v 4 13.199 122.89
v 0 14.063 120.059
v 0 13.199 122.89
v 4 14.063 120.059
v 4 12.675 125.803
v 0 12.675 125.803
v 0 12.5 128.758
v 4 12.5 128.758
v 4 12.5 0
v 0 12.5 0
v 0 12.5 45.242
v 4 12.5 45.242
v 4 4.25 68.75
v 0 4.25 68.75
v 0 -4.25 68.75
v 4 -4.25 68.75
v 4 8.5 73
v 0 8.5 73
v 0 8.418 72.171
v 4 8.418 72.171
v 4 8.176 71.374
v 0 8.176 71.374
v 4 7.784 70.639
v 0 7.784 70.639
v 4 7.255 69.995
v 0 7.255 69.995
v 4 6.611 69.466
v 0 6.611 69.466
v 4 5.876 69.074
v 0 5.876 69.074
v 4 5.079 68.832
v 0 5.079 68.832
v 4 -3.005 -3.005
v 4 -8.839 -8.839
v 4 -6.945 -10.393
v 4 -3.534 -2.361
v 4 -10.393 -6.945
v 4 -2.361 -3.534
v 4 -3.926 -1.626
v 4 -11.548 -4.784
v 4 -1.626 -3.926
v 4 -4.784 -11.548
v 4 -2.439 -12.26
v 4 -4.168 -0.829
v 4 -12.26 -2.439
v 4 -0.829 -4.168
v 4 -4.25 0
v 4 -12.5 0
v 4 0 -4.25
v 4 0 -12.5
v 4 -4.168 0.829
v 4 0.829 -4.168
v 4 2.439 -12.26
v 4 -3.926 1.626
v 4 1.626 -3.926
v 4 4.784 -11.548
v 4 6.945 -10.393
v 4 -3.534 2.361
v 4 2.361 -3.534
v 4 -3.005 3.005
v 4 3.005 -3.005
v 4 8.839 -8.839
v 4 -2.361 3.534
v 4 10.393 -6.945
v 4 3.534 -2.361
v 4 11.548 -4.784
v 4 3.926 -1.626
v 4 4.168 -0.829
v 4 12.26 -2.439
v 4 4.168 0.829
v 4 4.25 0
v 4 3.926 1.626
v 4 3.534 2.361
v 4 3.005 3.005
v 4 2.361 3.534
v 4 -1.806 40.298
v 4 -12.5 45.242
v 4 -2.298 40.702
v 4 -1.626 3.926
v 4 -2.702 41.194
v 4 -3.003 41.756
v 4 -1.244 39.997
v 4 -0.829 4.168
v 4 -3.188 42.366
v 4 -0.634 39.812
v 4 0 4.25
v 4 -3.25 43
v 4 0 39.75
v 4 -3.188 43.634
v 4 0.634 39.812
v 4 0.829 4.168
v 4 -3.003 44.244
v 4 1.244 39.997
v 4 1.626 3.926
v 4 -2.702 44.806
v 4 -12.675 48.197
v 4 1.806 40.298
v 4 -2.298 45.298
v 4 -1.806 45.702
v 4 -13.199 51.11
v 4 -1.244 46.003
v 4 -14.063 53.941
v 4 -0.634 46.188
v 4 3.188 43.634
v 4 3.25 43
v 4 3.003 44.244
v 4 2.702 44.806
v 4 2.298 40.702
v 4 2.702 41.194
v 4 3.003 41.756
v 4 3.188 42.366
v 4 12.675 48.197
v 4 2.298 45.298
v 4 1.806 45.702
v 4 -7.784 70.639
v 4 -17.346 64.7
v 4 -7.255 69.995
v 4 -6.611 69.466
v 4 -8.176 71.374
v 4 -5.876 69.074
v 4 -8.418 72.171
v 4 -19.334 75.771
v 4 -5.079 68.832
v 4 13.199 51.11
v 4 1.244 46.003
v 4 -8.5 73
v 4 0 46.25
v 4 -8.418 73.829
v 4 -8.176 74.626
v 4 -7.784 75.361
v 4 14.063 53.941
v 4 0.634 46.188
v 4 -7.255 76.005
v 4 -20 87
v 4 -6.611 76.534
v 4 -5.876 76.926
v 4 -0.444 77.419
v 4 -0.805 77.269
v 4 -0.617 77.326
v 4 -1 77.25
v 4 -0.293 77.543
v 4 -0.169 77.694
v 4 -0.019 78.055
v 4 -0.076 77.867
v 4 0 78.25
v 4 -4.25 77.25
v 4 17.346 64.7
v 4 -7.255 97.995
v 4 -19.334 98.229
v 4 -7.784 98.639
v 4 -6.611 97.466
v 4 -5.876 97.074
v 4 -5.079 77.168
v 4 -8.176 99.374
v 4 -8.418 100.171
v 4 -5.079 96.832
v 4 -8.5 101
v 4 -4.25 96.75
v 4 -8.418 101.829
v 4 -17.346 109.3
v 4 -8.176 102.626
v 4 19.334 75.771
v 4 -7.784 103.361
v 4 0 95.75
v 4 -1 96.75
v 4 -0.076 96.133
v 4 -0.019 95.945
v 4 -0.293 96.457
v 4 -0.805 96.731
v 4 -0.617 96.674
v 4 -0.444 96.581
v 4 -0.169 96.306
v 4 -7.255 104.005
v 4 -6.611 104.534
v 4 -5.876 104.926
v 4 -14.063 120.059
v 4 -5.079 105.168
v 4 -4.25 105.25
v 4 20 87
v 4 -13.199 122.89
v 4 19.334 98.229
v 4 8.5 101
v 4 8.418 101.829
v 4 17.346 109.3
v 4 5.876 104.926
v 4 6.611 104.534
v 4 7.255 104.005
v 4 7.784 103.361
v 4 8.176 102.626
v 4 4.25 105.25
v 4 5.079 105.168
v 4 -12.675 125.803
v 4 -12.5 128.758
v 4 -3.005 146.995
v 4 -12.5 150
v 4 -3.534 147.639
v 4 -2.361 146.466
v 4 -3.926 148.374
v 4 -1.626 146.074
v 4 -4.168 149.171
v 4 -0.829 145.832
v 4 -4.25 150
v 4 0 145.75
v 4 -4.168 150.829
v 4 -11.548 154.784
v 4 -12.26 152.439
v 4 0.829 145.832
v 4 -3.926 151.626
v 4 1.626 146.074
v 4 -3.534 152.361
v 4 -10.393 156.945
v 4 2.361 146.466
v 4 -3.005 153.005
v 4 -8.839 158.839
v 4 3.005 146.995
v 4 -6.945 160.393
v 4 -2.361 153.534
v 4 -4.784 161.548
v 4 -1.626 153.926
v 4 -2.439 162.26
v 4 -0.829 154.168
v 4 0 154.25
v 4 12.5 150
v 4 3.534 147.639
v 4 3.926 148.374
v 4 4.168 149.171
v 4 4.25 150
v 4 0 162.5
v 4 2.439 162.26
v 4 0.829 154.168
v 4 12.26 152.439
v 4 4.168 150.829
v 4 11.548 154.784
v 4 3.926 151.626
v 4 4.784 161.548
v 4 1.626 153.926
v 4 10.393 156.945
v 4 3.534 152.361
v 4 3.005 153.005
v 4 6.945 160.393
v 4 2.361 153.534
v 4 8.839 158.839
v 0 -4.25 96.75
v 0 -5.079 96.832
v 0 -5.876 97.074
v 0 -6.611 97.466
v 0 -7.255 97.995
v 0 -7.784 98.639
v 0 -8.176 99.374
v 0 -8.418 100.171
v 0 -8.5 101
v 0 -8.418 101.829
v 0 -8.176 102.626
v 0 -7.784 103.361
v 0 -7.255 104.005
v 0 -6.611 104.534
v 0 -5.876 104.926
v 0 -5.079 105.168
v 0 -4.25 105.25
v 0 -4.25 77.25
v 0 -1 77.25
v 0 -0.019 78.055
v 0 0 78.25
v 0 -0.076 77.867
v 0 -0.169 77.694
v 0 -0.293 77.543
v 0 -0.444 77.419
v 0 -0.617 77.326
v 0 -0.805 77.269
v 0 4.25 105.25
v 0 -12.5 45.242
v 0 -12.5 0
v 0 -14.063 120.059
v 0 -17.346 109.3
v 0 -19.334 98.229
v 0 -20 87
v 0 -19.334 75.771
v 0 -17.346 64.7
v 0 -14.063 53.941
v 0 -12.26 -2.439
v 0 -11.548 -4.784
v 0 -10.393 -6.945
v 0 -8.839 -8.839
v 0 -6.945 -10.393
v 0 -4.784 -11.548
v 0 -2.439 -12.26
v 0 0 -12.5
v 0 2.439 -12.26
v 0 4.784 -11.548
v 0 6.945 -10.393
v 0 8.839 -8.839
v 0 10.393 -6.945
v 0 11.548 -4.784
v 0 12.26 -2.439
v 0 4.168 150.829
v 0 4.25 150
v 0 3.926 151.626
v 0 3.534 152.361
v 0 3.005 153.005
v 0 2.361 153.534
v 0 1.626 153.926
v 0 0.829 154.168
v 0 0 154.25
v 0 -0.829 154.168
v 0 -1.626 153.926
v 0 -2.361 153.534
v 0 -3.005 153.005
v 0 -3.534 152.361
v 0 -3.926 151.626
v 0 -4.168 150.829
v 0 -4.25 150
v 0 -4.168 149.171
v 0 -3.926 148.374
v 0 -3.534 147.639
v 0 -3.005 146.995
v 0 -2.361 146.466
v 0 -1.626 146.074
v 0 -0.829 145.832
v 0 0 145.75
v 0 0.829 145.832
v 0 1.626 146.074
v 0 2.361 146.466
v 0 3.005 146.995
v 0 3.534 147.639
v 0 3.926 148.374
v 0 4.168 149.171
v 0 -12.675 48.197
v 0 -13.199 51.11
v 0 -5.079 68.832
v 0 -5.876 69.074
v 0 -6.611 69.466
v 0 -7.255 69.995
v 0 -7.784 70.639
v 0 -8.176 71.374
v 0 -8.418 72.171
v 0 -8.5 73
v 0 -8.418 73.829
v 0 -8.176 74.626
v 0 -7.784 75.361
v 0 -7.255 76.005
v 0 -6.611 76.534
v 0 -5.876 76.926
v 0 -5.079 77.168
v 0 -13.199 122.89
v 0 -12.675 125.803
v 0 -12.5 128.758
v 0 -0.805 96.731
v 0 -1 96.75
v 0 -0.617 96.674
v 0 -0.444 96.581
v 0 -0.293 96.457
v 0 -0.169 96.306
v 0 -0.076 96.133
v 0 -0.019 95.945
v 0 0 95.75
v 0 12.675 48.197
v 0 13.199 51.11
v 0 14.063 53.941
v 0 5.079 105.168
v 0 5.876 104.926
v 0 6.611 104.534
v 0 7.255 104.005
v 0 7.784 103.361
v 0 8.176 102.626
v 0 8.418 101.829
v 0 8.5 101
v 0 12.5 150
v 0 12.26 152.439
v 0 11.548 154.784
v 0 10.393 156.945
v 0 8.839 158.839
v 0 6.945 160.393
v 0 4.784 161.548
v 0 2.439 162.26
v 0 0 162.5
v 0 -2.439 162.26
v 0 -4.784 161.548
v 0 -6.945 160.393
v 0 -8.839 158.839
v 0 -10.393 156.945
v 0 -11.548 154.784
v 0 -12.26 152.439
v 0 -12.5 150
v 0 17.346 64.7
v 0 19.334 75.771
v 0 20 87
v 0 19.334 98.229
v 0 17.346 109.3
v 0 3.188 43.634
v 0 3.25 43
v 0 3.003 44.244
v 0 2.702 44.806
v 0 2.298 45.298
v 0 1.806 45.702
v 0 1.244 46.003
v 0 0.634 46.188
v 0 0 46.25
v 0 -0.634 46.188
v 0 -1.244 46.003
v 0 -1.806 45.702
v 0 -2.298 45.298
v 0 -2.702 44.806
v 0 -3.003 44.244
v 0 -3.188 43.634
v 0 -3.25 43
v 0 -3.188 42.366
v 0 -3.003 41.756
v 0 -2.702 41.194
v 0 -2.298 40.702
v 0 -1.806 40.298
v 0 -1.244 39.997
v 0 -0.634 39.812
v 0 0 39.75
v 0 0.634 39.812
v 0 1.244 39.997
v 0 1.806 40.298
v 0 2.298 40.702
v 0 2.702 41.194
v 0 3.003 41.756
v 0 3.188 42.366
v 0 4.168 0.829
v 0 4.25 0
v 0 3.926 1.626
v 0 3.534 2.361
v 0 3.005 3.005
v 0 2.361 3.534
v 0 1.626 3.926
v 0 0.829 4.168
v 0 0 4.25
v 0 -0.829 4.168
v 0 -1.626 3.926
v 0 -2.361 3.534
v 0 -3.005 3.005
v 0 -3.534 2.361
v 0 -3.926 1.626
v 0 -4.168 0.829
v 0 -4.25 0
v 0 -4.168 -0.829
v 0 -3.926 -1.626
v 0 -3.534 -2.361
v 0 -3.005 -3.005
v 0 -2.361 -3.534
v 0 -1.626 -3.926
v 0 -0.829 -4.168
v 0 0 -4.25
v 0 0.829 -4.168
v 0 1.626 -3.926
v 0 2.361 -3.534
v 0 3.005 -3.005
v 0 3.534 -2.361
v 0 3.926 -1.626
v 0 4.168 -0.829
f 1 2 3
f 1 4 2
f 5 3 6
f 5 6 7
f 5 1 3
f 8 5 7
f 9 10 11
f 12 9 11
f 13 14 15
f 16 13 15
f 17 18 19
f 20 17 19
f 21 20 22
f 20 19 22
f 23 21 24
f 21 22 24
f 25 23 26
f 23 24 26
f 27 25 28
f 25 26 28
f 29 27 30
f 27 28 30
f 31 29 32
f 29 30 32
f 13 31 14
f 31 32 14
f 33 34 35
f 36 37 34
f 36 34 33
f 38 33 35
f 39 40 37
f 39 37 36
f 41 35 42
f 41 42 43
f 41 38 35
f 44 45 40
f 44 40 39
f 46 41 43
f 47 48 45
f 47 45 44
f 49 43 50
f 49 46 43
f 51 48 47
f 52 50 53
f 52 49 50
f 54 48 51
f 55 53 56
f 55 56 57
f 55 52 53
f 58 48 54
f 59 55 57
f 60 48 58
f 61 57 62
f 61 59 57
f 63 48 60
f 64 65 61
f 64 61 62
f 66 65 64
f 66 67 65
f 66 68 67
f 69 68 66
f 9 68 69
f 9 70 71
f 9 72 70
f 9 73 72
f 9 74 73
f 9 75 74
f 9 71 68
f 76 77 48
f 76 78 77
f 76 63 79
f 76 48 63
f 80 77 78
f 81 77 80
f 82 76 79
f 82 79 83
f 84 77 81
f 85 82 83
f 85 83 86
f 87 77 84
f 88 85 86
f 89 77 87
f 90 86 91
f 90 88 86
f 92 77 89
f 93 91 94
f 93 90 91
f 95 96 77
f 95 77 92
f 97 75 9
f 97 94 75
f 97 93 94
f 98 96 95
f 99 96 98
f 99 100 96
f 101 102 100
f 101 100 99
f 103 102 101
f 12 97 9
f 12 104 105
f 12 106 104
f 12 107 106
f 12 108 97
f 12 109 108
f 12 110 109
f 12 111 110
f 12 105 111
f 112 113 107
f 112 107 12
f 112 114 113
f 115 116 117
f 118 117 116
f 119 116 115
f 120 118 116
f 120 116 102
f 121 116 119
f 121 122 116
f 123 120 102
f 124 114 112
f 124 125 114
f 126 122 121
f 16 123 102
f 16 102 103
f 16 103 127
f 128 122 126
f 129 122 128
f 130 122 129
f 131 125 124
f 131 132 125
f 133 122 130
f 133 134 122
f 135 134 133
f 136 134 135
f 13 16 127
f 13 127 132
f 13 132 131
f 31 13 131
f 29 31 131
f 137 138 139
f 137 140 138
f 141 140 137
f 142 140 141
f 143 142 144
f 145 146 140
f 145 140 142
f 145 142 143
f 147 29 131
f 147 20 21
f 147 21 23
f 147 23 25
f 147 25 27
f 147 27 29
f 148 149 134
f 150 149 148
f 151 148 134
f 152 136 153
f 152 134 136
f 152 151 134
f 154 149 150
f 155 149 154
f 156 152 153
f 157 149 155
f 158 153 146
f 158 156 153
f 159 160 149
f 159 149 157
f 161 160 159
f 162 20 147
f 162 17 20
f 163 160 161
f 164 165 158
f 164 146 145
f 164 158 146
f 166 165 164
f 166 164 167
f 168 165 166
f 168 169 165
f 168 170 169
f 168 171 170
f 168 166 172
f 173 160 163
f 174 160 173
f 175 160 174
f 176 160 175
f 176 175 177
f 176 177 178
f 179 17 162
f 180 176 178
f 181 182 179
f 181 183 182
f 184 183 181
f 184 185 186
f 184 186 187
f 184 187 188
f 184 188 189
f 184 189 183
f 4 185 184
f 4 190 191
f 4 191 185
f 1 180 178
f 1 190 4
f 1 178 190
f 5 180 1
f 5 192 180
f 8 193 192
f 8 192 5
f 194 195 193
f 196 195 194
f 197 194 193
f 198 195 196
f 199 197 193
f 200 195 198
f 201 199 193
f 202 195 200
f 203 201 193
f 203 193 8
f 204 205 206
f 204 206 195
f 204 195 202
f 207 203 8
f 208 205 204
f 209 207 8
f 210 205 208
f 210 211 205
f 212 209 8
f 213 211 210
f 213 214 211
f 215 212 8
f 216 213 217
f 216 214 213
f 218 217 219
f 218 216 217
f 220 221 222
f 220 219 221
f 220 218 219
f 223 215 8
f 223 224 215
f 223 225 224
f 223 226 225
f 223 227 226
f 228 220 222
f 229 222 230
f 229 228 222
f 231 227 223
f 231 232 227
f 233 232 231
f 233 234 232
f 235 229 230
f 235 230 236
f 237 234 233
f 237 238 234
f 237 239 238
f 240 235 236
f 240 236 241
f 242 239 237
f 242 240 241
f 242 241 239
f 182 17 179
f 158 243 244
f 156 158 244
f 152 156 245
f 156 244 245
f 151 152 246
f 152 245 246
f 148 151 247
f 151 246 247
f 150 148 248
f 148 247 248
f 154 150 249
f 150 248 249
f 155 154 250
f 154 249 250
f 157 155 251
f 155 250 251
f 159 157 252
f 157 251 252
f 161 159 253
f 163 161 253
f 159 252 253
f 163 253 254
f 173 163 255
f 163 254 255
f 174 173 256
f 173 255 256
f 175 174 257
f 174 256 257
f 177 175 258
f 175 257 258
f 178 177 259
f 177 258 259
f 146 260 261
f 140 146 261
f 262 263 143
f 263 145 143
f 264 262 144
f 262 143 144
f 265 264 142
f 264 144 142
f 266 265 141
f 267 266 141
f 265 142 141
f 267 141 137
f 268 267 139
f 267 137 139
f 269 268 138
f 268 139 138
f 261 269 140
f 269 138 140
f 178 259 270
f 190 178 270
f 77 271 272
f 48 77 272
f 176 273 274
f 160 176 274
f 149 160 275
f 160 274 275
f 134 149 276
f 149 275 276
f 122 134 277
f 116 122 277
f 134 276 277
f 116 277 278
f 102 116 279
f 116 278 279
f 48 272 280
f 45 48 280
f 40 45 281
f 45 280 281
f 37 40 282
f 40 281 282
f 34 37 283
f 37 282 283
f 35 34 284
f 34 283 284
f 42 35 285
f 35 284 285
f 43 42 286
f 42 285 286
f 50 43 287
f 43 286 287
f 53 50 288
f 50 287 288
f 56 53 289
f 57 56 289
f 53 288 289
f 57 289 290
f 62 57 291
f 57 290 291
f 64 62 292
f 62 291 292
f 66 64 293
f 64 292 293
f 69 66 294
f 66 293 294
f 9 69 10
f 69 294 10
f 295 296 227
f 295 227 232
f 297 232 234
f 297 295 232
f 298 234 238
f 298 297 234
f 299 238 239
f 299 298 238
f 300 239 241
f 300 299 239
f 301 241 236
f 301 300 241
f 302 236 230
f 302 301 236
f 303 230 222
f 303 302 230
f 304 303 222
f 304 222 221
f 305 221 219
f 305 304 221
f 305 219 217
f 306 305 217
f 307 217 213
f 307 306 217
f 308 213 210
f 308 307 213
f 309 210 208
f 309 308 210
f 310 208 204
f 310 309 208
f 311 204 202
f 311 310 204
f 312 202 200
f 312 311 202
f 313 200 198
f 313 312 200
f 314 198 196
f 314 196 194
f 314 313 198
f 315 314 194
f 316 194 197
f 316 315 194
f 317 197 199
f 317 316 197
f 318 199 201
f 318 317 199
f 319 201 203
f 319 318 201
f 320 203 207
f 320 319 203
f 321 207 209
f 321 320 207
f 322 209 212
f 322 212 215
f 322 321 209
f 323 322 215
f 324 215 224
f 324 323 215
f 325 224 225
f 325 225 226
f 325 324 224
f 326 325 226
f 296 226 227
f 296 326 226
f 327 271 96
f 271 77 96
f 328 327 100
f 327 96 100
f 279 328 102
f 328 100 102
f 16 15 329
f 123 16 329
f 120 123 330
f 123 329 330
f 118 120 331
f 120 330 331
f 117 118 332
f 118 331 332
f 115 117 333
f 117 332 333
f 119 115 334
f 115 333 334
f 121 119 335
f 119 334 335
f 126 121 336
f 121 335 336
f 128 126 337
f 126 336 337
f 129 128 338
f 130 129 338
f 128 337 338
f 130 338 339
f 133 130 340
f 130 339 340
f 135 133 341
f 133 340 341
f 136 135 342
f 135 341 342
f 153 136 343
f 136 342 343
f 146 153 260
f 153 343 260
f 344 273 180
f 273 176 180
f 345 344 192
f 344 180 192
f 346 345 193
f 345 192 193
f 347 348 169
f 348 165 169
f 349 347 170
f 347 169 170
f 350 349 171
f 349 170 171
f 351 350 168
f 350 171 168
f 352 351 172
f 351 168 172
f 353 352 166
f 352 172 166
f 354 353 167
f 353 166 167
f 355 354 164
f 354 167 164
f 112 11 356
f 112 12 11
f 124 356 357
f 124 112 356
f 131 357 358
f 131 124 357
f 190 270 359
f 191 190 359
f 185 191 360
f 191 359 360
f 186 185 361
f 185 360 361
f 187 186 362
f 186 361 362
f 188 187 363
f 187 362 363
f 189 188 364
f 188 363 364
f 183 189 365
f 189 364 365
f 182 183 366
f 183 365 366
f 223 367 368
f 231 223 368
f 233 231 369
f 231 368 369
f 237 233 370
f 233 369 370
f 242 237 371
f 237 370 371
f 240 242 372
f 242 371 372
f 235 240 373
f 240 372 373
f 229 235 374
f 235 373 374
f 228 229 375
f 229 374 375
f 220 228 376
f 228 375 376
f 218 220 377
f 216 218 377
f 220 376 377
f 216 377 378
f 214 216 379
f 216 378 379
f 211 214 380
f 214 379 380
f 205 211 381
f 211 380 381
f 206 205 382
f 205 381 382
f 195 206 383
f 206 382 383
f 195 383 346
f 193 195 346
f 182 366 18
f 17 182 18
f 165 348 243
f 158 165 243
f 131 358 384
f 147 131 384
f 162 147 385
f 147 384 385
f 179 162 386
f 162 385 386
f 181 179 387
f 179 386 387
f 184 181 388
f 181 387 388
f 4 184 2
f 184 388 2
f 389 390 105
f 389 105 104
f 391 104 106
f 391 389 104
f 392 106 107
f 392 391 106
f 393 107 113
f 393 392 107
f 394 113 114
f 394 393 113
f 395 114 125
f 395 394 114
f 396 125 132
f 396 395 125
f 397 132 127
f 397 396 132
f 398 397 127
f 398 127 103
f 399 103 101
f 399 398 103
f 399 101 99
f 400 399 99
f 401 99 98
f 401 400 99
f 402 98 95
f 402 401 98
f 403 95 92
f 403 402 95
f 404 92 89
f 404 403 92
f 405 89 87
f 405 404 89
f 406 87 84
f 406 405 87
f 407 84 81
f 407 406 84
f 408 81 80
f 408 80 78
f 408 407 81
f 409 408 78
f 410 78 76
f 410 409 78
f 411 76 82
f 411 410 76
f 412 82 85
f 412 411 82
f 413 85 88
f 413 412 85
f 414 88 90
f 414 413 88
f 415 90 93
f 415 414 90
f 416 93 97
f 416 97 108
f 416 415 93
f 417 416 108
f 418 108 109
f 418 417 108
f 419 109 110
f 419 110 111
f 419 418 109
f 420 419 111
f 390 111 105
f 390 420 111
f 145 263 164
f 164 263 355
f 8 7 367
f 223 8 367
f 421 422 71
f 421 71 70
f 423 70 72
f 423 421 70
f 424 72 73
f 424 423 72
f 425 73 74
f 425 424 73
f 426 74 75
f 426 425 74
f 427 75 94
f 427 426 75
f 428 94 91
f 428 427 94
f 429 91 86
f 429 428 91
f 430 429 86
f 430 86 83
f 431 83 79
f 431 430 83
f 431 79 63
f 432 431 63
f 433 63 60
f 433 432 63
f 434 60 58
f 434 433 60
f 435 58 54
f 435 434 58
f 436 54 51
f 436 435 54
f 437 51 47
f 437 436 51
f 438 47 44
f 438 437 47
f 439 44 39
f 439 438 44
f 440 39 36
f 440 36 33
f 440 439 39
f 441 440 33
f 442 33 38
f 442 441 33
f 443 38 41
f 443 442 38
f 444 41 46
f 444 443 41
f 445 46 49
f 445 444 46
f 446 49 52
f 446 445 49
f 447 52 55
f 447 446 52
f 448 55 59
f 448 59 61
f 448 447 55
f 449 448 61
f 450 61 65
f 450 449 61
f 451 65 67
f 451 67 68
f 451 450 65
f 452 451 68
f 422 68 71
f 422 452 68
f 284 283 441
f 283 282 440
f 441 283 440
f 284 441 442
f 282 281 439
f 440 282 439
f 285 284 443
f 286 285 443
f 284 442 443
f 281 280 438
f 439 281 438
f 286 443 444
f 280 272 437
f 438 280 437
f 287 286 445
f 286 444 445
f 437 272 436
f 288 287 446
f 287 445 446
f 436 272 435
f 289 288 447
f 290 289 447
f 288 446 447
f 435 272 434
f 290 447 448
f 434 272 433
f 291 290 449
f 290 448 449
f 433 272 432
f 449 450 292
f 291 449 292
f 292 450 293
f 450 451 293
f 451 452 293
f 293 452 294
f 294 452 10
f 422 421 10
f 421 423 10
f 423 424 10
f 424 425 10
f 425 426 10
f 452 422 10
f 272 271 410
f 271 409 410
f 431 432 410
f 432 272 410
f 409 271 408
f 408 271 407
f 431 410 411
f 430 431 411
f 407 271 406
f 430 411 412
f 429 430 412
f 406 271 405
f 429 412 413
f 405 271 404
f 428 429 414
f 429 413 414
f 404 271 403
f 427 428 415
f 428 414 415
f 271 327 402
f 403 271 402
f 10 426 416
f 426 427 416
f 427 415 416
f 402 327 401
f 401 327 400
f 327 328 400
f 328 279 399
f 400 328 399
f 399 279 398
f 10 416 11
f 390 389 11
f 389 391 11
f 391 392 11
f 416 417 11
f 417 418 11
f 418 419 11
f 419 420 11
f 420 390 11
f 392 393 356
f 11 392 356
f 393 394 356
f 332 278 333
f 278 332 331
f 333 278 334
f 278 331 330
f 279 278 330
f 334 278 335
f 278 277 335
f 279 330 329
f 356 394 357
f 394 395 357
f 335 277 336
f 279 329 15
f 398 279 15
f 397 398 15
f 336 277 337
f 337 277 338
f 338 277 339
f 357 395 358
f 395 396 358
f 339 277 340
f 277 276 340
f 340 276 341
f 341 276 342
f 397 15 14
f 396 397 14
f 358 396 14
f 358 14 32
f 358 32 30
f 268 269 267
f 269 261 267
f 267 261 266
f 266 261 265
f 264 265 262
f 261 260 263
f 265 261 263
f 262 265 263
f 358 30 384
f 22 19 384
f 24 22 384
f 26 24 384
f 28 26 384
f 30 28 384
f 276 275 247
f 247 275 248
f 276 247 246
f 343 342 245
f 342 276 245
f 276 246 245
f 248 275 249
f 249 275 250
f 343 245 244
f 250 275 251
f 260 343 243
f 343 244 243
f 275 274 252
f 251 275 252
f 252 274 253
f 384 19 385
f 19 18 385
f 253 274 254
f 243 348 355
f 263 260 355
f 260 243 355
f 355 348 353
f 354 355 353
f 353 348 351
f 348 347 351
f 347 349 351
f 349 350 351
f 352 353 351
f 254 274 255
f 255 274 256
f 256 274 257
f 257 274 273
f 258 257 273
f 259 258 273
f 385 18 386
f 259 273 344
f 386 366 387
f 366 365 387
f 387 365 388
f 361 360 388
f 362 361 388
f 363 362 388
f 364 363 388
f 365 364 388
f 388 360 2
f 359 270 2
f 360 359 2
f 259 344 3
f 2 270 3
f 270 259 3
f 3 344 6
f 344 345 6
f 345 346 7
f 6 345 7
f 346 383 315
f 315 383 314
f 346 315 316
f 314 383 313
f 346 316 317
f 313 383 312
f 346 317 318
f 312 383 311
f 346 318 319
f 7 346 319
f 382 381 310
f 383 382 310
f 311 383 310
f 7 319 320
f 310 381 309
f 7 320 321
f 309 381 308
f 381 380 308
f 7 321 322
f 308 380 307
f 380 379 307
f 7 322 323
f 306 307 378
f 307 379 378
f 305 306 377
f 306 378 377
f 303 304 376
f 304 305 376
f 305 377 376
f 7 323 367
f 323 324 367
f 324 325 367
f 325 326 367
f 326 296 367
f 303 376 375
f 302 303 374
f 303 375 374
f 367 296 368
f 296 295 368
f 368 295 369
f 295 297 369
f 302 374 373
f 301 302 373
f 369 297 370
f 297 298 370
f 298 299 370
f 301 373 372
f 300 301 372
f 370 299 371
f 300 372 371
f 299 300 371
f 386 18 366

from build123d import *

# Parameters (mm, degrees)
F0_R     = 4.25
F0_R_2   = 3.25
F1_DEPTH = 4
F2_R     = 25
F3_R     = 1


with BuildPart() as f1:
    # F0 (on Right) → F1 (new body)
    with BuildSketch(Plane.YZ):
        with BuildLine():
            ThreePointArc((-12.5, 0), (0, -12.5), (12.5, 0))
            Line((12.5, 0), (12.5, 50.003379))
            ThreePointArc((12.5, 50.003379), (20, 87), (12.5, 123.996621))
            Line((12.5, 123.996621), (12.5, 150))
            ThreePointArc((12.5, 150), (0, 162.5), (-12.5, 150))
            Line((-12.5, 150), (-12.5, 123.996621))
            ThreePointArc((-12.5, 123.996621), (-20, 87), (-12.5, 50.003379))
            Line((-12.5, 50.003379), (-12.5, 0))
        make_face()
        Circle(F0_R, mode=Mode.SUBTRACT)
        with Locations((0, 43)):
            Circle(F0_R_2, mode=Mode.SUBTRACT)
        with BuildLine():
            ThreePointArc((-4.25, 96.75), (-8.5, 101), (-4.25, 105.25))
            Line((-4.25, 105.25), (4.25, 105.25))
            ThreePointArc((4.25, 105.25), (7.255204, 104.005204), (8.5, 101))
            Line((8.5, 101), (8.5, 73))
            ThreePointArc((8.5, 73), (7.255204, 69.994796), (4.25, 68.75))
            Line((4.25, 68.75), (-4.25, 68.75))
            ThreePointArc((-4.25, 68.75), (-8.5, 73), (-4.25, 77.25))
            Line((-4.25, 77.25), (0, 77.25))
            Line((0, 77.25), (0, 96.75))
            Line((0, 96.75), (-4.25, 96.75))
        make_face(mode=Mode.SUBTRACT)
        with Locations((0, 150)):
            Circle(F0_R, mode=Mode.SUBTRACT)
    extrude(amount=F1_DEPTH)

    # F2
    f2_edges = [f1.edges().sort_by_distance(p)[0] for p in [
        (2, 12.5, 123.996621),
        (2, -12.5, 123.996621),
        (2, -12.5, 50.003379),
        (2, 12.5, 50.003379),
    ]]
    fillet(f2_edges, radius=F2_R)

    # F3
    f3_edges = [f1.edges().sort_by_distance(p)[0] for p in [
        (2, 0, 96.75),
        (2, 0, 77.25),
    ]]
    fillet(f3_edges, radius=F3_R)


solid = f1.part
